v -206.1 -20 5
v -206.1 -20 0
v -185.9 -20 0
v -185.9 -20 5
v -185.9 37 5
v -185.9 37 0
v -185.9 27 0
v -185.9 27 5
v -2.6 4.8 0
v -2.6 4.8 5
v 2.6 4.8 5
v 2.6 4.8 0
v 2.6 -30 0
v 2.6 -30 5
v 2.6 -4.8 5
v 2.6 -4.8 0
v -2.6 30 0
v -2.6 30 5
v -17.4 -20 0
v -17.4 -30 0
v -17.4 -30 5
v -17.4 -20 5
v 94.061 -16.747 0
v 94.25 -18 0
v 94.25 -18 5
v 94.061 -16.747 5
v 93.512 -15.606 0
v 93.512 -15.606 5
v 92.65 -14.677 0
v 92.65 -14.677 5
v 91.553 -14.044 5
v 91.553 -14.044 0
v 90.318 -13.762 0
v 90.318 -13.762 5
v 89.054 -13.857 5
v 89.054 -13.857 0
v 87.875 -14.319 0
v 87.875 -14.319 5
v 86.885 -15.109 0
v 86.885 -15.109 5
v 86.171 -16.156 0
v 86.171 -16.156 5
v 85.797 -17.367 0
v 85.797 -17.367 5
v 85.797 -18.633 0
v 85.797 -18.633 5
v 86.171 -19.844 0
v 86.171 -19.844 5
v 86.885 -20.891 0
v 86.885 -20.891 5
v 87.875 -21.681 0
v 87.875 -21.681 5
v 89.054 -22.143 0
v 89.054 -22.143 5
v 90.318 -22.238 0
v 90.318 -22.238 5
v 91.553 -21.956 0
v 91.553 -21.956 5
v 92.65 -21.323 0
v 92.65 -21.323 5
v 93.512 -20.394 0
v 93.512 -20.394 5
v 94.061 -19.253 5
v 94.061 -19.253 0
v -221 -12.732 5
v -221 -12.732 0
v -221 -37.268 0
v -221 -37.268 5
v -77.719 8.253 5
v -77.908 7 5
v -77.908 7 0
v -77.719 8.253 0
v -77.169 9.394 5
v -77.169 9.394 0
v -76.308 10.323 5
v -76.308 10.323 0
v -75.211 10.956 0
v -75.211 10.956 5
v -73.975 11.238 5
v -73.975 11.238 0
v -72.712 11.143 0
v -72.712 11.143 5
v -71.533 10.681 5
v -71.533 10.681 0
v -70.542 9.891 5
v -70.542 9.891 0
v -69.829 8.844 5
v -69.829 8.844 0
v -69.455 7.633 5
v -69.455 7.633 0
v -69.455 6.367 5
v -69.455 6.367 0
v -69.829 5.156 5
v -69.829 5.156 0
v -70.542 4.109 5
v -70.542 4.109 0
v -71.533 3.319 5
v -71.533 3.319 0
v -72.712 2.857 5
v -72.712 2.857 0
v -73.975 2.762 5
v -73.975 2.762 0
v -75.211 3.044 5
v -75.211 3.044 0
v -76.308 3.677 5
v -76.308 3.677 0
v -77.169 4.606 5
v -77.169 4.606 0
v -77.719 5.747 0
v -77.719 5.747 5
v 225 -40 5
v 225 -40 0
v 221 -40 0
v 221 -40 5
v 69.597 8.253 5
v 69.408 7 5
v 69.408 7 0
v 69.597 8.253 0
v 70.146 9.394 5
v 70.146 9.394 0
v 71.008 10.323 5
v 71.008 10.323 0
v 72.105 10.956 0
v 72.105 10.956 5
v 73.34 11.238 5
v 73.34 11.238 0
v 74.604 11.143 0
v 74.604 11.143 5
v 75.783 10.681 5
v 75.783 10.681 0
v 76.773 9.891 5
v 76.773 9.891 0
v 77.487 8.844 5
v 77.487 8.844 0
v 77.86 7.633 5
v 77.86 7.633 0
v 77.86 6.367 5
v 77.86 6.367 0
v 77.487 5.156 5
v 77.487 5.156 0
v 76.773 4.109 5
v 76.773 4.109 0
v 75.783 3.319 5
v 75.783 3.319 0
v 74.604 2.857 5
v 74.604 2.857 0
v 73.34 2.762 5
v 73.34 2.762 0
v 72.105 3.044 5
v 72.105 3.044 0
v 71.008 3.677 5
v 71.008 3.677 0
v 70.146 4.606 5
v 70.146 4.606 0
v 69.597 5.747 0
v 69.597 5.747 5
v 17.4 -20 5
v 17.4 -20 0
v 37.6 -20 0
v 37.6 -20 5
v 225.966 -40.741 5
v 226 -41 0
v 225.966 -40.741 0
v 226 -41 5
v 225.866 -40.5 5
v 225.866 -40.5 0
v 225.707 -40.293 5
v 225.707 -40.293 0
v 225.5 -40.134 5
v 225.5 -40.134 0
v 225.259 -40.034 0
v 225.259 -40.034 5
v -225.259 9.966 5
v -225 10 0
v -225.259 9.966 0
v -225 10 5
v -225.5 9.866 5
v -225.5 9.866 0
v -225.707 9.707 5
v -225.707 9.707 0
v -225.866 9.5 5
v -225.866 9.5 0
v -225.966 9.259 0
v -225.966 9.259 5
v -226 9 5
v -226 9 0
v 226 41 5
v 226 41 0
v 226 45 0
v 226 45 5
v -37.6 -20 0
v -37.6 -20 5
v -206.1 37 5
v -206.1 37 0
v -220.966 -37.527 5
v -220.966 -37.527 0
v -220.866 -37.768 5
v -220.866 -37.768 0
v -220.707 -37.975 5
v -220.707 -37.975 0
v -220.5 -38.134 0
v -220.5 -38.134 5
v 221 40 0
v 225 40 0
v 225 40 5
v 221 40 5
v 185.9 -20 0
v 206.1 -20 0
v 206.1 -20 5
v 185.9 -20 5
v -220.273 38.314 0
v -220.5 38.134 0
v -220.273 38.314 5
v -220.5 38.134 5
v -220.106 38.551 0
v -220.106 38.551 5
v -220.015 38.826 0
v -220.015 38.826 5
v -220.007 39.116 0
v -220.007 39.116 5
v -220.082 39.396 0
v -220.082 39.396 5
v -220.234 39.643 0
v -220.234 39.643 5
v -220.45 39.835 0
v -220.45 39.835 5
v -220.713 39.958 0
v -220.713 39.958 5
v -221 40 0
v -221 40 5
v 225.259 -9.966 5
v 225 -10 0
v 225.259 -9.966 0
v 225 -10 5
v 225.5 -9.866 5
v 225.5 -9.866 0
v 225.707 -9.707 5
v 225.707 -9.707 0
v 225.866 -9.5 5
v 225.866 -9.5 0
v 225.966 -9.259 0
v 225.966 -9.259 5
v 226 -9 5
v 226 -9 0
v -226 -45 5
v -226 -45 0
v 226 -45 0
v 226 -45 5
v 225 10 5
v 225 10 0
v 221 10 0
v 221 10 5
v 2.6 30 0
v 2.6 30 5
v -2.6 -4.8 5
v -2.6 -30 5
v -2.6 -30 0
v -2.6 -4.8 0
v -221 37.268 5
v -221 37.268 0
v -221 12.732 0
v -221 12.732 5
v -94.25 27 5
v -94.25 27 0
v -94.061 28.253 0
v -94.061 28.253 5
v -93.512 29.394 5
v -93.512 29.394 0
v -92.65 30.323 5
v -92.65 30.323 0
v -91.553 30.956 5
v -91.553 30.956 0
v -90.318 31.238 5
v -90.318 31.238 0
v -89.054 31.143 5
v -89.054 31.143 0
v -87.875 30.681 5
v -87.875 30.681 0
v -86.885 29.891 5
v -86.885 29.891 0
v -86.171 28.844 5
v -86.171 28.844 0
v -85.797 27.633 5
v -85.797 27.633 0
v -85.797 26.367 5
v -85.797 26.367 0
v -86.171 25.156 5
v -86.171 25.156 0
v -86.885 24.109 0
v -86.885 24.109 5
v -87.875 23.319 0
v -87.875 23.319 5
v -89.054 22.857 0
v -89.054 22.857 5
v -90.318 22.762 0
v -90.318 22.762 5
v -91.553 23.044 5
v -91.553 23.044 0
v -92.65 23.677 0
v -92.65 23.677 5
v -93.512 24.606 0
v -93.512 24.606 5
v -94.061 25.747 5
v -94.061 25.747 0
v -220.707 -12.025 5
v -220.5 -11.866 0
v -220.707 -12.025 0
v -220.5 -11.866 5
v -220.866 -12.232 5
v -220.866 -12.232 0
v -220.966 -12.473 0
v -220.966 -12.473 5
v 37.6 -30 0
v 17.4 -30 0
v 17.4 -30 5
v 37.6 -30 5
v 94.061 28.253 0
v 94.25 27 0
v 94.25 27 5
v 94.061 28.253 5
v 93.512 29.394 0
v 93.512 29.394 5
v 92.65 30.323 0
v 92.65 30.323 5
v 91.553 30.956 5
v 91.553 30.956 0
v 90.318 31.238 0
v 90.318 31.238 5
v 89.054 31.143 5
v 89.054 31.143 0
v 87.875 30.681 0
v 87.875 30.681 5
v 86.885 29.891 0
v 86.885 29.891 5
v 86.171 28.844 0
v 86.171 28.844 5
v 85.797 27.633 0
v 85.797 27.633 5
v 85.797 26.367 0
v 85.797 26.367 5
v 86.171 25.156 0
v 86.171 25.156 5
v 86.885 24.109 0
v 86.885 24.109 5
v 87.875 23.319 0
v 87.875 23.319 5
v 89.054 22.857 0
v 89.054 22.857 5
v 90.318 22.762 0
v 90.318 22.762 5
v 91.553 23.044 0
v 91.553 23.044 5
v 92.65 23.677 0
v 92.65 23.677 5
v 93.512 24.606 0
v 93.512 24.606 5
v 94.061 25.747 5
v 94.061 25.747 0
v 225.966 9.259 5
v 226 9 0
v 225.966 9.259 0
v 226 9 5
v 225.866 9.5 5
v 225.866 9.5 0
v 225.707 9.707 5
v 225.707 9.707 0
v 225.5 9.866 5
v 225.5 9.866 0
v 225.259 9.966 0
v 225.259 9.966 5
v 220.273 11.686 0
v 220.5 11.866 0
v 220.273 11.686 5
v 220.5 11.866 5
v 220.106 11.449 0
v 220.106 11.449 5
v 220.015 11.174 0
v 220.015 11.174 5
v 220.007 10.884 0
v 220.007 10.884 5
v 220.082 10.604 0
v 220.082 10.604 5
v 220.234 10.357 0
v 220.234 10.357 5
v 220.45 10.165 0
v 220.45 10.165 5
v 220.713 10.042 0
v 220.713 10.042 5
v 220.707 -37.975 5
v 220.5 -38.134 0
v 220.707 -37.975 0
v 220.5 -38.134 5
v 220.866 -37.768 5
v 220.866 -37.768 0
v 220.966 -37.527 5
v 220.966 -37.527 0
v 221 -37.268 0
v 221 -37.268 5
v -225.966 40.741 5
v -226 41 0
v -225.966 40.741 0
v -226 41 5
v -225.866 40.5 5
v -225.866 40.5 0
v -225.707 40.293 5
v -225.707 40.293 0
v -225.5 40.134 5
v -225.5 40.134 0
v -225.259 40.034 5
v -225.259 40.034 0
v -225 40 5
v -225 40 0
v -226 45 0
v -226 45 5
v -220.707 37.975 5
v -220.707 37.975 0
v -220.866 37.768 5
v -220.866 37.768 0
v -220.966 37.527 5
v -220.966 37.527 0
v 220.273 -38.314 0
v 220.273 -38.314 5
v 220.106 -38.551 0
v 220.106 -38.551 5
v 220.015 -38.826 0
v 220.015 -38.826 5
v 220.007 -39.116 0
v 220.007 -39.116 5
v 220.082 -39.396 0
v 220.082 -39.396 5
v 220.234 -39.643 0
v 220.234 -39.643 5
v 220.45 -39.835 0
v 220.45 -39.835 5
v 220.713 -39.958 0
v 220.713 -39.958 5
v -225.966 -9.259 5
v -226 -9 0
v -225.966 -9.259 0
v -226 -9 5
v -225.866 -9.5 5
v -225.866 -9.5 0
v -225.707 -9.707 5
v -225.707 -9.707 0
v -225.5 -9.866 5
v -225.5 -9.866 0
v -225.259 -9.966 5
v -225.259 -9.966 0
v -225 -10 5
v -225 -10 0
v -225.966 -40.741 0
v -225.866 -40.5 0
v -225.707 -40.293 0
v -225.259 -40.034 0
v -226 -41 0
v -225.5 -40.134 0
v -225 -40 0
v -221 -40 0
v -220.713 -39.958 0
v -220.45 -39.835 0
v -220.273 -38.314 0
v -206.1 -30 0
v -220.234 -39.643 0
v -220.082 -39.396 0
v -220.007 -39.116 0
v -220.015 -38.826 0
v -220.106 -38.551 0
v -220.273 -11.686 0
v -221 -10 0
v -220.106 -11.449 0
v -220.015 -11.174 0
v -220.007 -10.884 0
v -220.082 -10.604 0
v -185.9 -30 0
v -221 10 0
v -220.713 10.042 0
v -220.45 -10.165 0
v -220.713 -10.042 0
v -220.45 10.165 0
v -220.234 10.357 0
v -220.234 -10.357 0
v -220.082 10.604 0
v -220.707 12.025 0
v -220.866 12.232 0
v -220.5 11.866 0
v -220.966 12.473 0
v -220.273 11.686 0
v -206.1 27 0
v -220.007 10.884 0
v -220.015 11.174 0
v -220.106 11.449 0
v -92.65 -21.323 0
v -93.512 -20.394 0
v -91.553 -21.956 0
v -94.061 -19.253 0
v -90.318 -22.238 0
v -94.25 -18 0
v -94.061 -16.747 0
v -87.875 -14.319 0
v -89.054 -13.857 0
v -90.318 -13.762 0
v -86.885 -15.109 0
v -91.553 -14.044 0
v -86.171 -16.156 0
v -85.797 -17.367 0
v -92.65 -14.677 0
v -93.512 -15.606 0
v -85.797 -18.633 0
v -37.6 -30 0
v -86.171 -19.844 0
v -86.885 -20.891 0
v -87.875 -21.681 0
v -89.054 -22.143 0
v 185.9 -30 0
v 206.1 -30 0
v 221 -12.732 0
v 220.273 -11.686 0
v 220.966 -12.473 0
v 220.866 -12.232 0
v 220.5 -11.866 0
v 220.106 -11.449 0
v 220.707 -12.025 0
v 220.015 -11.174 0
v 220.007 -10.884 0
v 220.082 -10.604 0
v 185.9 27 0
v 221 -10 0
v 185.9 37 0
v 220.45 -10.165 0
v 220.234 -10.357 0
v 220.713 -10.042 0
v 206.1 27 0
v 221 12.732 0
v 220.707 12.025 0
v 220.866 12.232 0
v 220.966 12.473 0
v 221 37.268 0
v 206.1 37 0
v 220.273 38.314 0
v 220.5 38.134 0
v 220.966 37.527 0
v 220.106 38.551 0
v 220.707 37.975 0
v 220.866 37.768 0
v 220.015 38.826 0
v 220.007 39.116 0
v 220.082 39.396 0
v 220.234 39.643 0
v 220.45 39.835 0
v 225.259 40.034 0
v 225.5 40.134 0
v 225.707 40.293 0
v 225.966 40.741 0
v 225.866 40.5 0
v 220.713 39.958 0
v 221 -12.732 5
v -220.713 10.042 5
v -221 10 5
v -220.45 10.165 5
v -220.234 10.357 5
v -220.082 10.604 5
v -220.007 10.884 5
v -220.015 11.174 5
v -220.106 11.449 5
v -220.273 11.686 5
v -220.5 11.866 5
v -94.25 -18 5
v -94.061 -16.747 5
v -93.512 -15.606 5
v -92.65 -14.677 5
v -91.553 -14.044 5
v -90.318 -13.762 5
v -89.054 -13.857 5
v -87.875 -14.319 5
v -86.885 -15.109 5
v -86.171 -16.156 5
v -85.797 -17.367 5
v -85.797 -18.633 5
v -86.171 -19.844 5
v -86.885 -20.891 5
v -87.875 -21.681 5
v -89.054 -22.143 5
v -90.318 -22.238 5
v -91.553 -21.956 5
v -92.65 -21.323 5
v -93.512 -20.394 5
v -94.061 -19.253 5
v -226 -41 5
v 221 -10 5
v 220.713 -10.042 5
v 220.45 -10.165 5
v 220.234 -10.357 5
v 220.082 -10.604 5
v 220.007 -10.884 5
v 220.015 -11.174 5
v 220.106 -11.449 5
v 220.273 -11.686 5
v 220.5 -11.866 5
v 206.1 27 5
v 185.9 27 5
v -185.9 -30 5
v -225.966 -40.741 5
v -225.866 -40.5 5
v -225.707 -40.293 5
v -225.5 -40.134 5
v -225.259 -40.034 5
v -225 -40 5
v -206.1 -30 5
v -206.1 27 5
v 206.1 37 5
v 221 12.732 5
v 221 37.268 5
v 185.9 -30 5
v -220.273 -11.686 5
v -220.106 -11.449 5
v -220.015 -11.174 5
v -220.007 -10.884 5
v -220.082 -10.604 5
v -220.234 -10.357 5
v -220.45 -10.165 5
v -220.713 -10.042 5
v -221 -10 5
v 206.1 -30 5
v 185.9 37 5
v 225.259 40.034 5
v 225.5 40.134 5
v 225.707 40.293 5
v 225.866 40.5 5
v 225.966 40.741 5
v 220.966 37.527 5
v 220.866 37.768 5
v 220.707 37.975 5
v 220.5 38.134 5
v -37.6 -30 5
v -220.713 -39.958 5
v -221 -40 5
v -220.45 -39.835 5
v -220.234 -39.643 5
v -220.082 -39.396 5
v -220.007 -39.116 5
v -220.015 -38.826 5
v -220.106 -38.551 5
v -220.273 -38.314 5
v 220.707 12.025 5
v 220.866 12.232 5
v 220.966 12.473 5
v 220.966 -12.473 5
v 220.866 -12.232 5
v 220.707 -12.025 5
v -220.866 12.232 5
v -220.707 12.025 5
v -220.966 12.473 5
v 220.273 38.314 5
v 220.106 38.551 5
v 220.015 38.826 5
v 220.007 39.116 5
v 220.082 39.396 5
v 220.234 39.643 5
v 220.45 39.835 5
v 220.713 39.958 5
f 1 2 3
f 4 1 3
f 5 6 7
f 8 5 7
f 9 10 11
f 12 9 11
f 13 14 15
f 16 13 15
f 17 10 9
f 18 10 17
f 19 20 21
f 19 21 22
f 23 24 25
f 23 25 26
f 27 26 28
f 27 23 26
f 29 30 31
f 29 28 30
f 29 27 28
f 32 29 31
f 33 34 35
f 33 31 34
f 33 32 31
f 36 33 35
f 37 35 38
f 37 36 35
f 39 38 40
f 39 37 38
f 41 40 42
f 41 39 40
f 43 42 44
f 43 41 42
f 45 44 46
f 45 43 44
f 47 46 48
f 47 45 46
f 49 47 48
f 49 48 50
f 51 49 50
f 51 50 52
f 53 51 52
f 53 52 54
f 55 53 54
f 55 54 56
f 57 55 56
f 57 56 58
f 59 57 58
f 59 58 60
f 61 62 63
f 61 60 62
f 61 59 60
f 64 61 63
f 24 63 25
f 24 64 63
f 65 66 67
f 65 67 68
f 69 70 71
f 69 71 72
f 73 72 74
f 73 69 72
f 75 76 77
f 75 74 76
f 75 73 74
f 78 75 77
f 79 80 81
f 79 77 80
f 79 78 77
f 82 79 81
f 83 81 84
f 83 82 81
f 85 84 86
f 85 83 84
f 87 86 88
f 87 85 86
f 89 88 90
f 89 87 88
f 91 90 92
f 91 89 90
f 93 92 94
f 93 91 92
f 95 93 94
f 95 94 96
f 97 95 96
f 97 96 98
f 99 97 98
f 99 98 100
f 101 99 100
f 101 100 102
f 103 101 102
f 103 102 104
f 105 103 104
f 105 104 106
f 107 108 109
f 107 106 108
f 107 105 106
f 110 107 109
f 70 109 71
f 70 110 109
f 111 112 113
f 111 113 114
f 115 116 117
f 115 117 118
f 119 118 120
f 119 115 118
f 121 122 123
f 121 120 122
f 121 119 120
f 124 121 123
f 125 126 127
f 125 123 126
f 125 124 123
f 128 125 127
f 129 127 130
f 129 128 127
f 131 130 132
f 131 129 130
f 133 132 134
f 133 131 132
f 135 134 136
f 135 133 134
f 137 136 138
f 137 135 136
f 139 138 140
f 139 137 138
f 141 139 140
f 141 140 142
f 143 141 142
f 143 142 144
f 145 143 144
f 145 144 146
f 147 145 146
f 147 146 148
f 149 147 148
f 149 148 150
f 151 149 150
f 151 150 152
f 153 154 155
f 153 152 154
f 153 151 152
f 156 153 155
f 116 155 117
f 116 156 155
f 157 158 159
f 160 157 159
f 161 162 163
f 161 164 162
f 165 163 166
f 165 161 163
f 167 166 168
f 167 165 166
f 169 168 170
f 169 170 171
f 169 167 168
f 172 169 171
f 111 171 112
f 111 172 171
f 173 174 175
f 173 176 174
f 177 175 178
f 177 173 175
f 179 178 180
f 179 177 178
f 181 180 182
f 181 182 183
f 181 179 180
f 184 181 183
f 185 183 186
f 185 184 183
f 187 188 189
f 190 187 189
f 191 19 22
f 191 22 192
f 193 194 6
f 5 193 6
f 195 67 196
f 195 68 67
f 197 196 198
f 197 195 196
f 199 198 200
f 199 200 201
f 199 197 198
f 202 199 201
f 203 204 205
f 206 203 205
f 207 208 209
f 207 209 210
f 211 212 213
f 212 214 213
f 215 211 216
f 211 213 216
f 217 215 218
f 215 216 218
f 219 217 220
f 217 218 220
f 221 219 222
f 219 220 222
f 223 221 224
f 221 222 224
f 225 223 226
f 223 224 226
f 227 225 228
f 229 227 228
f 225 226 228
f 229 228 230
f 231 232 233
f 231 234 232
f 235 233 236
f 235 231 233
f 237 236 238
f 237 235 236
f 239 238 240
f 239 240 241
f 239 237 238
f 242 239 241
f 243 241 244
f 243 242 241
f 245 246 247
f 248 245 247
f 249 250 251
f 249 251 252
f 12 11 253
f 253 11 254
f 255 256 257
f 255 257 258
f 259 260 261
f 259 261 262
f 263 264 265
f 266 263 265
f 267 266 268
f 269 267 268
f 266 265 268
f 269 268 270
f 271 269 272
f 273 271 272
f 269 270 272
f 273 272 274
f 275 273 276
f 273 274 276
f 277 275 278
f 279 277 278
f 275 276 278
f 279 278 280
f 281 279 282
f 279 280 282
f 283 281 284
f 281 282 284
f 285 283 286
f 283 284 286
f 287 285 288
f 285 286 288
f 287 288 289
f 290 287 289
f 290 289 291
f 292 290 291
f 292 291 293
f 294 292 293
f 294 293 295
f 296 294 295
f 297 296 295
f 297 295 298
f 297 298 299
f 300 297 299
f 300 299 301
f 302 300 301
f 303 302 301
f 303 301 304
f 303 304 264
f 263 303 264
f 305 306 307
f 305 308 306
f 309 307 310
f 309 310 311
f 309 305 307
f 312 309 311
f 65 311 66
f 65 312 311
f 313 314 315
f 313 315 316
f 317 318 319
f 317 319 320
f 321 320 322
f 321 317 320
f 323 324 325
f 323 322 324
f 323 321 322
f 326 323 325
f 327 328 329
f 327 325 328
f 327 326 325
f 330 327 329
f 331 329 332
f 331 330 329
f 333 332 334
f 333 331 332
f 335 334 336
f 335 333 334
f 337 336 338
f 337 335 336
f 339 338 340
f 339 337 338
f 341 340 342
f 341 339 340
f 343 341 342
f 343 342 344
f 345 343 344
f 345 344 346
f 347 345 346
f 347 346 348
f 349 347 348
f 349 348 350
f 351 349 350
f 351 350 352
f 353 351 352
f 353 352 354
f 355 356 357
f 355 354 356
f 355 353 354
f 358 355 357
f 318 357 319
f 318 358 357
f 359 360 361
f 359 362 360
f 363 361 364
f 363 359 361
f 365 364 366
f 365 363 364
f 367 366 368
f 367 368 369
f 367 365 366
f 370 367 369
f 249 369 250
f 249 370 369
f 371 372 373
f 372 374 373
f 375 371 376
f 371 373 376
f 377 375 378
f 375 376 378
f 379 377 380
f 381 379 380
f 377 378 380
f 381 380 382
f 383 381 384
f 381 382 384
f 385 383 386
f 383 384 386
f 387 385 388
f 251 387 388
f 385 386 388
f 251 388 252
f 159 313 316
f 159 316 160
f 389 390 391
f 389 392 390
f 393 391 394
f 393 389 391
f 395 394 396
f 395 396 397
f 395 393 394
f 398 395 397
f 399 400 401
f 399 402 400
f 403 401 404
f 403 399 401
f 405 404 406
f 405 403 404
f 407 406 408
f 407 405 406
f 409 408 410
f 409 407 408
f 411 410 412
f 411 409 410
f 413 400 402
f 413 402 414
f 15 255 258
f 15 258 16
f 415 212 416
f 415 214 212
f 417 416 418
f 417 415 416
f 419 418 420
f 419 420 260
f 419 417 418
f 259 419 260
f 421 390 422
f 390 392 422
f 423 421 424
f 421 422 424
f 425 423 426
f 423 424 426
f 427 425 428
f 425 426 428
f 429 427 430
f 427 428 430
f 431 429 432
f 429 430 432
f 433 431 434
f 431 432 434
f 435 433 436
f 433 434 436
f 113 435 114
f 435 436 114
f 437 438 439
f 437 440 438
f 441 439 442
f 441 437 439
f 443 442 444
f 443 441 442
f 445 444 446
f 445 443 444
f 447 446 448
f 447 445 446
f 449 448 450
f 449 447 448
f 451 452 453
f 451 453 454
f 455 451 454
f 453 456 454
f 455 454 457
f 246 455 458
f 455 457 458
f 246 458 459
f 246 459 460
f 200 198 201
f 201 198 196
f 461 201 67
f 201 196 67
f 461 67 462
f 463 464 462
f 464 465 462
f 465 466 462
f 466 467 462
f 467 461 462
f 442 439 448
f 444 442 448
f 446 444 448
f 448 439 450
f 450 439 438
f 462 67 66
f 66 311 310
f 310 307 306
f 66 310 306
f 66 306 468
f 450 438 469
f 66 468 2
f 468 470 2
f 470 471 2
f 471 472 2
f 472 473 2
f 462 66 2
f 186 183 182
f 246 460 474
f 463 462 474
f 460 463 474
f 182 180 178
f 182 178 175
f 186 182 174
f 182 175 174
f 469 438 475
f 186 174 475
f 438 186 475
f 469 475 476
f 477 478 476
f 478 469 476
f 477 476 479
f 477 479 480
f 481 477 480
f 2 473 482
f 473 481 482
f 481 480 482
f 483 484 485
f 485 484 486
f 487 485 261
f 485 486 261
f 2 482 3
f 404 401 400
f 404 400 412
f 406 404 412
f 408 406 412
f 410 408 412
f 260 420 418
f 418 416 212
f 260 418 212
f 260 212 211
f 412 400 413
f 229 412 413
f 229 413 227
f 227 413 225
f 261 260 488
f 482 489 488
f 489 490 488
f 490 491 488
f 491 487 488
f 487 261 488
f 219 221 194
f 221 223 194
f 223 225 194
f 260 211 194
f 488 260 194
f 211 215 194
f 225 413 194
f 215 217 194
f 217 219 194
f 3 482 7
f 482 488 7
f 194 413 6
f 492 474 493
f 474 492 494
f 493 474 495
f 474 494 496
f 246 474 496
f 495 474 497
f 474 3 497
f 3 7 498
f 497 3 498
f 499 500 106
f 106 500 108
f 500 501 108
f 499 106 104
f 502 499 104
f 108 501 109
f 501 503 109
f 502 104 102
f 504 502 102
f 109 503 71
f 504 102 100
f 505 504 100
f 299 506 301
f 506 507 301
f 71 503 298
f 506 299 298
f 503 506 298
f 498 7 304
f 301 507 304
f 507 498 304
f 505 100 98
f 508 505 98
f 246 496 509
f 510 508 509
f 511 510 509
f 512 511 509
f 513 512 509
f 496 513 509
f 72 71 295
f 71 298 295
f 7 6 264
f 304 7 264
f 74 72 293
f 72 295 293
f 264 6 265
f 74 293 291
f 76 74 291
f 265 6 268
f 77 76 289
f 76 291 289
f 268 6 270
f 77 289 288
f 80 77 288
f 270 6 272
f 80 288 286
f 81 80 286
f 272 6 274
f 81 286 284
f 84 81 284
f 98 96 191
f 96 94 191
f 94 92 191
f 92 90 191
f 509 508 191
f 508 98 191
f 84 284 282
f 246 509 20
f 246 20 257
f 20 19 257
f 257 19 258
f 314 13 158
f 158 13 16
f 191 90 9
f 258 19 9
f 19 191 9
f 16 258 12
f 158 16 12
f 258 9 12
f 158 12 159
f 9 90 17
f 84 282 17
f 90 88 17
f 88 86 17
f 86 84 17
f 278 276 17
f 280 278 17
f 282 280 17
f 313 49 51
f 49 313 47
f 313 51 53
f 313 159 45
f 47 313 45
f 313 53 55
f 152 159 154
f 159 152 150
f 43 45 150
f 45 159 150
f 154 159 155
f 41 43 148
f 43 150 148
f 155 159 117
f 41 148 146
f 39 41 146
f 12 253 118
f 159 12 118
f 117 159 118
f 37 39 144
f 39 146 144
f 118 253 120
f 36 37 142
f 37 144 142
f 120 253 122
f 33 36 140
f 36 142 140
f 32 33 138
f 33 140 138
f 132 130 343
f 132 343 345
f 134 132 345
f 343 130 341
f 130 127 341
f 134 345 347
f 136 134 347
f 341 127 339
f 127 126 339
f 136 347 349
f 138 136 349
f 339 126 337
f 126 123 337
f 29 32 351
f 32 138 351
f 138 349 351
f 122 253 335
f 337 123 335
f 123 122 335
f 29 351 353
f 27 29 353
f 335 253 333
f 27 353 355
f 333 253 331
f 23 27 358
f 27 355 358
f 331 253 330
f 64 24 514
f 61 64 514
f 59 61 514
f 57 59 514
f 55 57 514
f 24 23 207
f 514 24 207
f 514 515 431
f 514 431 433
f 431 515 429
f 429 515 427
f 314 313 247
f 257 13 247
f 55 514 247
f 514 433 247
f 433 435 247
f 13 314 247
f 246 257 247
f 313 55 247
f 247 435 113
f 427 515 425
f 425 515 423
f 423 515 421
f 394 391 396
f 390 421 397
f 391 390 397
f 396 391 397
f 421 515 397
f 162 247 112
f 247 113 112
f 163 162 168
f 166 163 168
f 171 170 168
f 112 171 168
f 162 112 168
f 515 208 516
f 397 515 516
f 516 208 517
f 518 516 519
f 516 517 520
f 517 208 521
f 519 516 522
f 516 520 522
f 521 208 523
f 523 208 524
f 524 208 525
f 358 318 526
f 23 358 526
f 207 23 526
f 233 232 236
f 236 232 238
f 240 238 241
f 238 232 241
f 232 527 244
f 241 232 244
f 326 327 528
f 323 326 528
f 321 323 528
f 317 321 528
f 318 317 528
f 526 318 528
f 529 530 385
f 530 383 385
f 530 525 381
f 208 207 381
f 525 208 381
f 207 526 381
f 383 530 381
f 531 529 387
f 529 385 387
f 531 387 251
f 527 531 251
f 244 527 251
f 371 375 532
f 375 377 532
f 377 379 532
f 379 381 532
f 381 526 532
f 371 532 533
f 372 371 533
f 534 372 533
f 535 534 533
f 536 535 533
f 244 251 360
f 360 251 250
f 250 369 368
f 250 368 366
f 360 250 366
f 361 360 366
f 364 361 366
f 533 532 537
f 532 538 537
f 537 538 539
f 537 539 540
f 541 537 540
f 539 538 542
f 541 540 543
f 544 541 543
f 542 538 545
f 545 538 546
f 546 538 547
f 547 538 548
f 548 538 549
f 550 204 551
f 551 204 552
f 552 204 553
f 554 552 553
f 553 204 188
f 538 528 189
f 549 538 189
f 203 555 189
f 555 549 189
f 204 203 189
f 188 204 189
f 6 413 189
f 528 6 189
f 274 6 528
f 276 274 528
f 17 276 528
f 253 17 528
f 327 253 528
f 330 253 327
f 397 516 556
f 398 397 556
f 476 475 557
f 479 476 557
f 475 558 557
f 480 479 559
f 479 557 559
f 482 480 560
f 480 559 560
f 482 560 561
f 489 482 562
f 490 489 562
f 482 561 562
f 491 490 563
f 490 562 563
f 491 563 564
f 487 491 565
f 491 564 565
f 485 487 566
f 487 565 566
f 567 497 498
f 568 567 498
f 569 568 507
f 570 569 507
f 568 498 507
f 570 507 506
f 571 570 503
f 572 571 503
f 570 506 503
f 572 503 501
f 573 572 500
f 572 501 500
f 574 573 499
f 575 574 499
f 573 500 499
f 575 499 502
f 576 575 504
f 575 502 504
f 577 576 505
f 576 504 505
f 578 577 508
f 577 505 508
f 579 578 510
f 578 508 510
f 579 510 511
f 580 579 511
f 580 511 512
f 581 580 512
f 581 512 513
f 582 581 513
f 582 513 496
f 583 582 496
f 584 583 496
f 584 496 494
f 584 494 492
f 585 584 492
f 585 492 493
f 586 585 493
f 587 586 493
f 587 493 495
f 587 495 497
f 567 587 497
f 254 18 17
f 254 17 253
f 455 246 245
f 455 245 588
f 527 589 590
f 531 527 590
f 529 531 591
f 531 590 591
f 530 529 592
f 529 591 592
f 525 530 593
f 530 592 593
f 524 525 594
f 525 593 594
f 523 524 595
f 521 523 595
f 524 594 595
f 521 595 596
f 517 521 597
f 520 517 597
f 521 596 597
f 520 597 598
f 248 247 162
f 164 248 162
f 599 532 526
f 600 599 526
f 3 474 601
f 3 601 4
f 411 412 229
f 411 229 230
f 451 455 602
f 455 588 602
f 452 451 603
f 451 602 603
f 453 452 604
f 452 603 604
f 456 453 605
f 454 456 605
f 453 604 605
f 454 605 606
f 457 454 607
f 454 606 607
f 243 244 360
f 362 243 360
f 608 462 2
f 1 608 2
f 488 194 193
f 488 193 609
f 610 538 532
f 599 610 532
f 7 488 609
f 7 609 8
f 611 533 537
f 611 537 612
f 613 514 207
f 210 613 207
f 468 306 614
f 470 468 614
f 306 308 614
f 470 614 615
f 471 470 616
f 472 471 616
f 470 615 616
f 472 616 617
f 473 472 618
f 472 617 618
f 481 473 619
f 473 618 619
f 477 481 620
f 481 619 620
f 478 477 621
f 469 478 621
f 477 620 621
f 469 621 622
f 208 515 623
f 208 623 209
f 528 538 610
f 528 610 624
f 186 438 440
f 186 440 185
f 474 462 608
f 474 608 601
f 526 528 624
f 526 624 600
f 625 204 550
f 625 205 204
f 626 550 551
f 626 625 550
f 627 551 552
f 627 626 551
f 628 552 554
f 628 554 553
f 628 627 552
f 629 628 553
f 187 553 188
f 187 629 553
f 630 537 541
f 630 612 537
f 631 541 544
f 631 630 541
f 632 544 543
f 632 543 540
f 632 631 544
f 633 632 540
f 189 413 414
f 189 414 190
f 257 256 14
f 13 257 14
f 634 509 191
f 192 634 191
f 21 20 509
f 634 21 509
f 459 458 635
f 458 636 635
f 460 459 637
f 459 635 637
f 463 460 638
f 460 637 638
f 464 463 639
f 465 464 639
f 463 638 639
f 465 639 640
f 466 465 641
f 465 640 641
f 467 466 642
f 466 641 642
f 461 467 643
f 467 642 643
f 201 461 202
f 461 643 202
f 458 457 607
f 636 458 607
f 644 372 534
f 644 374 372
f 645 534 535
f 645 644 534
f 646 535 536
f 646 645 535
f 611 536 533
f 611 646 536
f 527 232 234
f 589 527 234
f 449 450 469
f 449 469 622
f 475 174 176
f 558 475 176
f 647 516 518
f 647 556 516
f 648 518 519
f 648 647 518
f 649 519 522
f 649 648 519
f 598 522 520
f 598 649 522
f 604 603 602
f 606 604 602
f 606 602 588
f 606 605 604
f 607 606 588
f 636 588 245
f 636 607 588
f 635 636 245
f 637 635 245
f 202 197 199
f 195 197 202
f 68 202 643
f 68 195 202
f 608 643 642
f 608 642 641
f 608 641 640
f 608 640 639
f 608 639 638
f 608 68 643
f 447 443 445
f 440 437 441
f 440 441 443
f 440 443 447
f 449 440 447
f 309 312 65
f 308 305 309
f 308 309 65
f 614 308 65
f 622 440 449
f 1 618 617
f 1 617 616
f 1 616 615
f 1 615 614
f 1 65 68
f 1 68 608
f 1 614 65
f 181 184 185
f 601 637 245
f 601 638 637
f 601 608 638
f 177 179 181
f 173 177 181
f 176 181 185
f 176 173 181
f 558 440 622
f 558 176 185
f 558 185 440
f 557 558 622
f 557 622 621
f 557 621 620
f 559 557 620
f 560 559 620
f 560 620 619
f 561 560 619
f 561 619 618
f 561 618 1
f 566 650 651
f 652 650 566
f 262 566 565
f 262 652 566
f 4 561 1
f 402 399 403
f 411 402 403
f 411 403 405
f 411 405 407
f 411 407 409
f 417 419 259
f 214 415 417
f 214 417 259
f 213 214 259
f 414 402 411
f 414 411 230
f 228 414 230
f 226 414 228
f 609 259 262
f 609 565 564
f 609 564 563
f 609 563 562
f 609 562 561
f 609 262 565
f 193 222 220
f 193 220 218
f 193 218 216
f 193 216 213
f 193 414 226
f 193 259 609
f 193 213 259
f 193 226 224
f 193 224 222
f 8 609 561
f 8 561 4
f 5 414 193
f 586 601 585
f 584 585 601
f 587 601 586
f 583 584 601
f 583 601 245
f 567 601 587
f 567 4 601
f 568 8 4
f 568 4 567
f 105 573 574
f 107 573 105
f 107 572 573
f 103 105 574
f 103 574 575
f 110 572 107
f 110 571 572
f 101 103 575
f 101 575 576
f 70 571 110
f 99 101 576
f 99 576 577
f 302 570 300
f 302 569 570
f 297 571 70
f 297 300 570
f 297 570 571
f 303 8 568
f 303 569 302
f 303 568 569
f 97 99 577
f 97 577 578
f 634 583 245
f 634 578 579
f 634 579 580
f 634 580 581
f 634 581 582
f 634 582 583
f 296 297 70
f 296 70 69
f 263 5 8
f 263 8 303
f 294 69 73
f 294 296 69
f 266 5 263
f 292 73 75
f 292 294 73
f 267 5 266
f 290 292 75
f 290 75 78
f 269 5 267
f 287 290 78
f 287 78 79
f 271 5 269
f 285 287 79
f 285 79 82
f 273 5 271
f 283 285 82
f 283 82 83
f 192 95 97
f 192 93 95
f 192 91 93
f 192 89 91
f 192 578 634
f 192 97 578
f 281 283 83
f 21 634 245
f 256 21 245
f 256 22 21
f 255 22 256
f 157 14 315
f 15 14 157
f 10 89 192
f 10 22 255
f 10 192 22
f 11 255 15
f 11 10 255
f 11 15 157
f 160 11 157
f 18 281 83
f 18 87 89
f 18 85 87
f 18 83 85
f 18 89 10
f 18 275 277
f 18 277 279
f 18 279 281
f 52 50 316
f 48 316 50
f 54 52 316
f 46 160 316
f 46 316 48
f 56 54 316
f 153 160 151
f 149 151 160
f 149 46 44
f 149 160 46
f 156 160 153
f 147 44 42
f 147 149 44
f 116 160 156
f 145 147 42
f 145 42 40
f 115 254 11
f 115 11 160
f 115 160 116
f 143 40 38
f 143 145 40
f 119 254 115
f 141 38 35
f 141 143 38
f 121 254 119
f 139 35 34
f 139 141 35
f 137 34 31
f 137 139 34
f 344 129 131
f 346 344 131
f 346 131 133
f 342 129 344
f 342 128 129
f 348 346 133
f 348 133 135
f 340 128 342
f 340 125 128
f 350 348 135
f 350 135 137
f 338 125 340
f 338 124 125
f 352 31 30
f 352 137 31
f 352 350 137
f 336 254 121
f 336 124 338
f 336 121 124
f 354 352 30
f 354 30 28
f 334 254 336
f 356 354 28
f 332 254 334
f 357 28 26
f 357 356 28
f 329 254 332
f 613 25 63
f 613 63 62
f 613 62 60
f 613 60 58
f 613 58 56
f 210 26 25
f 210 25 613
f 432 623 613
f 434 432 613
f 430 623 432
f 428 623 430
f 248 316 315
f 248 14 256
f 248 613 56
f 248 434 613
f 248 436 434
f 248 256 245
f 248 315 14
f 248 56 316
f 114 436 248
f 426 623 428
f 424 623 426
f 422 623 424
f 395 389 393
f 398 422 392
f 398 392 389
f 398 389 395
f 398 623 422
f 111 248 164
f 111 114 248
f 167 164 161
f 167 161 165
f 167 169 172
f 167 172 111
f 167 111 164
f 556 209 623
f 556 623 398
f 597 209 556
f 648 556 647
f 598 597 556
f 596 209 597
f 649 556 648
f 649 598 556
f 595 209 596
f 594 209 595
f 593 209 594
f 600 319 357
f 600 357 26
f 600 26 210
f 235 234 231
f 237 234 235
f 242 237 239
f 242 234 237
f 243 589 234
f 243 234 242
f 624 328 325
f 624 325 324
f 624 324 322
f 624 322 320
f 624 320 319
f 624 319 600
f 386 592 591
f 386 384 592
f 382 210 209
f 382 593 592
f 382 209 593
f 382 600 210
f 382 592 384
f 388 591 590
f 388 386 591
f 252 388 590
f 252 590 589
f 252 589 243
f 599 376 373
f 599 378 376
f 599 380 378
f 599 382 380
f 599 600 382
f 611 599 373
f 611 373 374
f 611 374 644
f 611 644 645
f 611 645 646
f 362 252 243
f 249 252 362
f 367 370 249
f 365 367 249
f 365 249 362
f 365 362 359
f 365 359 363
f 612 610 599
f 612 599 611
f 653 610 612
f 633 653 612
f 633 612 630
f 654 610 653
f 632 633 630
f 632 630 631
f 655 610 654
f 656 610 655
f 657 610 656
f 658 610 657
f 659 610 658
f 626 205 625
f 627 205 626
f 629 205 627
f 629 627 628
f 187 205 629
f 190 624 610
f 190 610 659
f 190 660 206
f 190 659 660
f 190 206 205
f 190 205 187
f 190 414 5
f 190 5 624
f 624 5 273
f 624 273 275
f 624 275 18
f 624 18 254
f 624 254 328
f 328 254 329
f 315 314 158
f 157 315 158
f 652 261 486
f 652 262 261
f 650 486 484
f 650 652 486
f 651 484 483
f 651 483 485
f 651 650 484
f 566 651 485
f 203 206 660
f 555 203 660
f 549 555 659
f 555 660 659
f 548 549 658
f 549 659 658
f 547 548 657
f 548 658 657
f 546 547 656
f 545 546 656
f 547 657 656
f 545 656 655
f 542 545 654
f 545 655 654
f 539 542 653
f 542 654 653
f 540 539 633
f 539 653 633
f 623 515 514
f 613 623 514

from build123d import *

# Parameters (mm, degrees)
SKETCH1_W                = 452
SKETCH1_H                = 90
BOSS_EXTRUDE1_DEPTH      = 5
SKETCH2_W                = 5.2
SKETCH2_H                = 25.2
CUT_EXTRUDE1_DEPTH       = 231.490780727
SKETCH4_W                = 5
SKETCH4_H                = 30
CUT_EXTRUDE5_DEPTH       = 5
SKETCH7_R                = 1
CUT_EXTRUDE6_DEPTH       = 231.490780727
FILLET4_R                = 1
SKETCH8_W                = 20.2
SKETCH8_H                = 10
CUT_EXTRUDE7_DEPTH       = 10
SKETCH9_W                = 20.2
SKETCH9_H                = 10
CUT_EXTRUDE8_DEPTH       = 300
MIRROR5_COPY_1_SKETCH_W  = 20.2
MIRROR5_COPY_1_SKETCH_H  = 10
MIRROR5_COPY_1_DEPTH     = 10
SKETCH11_R               = 4.25
CUT_EXTRUDE10_DEPTH      = 20
CUT_EXTRUDE11_DEPTH      = 30
CUT_EXTRUDE11_DEPTH_BACK = 600
SKETCH12_R               = 4.25


with BuildPart() as part:
    # Sketch1 → Boss-Extrude1 (new body)
    with BuildSketch(Plane.XY):
        Rectangle(SKETCH1_W, SKETCH1_H)
    extrude(amount=BOSS_EXTRUDE1_DEPTH)

    # Sketch2 → Cut-Extrude1 (cut, through all)
    with BuildSketch(Plane.XY.offset(5)):
        with Locations((0, 17.4)):
            Rectangle(SKETCH2_W, SKETCH2_H)
        with Locations((0, -17.4)):
            Rectangle(SKETCH2_W, SKETCH2_H)
    extrude(amount=-CUT_EXTRUDE1_DEPTH, mode=Mode.SUBTRACT)

    # Sketch4 → Cut-Extrude5 (cut)
    with BuildSketch(Plane.ZY.offset(226)):
        with Locations((2.5, 25)):
            Rectangle(SKETCH4_W, SKETCH4_H)
        with Locations((2.5, -25)):
            Rectangle(SKETCH4_W, SKETCH4_H)
    cut_extrude5 = extrude(amount=-CUT_EXTRUDE5_DEPTH, mode=Mode.SUBTRACT)

    # Mirror2: Cut-Extrude5 across plane
    add(cut_extrude5.mirror(Plane(origin=(0, 0, 0), x_dir=(0, 0, 1), z_dir=(1, 0, 0))), mode=Mode.SUBTRACT)

    # Sketch7 → Cut-Extrude6 (cut, through all)
    with BuildSketch(Plane.XY.offset(5)):
        with Locations((-221, 39)):
            Circle(SKETCH7_R)
        with Locations((-221, 11)):
            Circle(SKETCH7_R)
        with Locations((-221, -11)):
            Circle(SKETCH7_R)
        with Locations((-221, -39)):
            Circle(SKETCH7_R)
        with Locations((221, -39)):
            Circle(SKETCH7_R)
        with Locations((221, -11)):
            Circle(SKETCH7_R)
        with Locations((221, 11)):
            Circle(SKETCH7_R)
        with Locations((221, 39)):
            Circle(SKETCH7_R)
    extrude(amount=-CUT_EXTRUDE6_DEPTH, mode=Mode.SUBTRACT)

    # Fillet4
    fillet4_edges = [part.edges().sort_by_distance(p)[0] for p in [
        (221, 38, 2.5),
        (221, 12, 2.5),
        (221, -12, 2.5),
        (221, -38, 2.5),
        (-221, 38, 2.5),
        (-221, 12, 2.5),
        (-221, -38, 2.5),
        (-221, -12, 2.5),
        (-226, 10, 2.5),
        (-226, 40, 2.5),
        (-226, -40, 2.5),
        (-226, -10, 2.5),
        (226, 10, 2.5),
        (226, 40, 2.5),
        (226, -40, 2.5),
        (226, -10, 2.5),
    ]]
    fillet(fillet4_edges, radius=FILLET4_R)

    # Sketch8 → Cut-Extrude7 (cut)
    with BuildSketch(Plane(origin=(0, -610.456150304, 0), x_dir=(-1, 0, 0), z_dir=(0, 0, -1))):
        with Locations((-196, 585.456150304)):
            Rectangle(SKETCH8_W, SKETCH8_H)
    cut_extrude7 = extrude(amount=-CUT_EXTRUDE7_DEPTH, mode=Mode.SUBTRACT)

    # Mirror3: Cut-Extrude7 across plane
    add(cut_extrude7.mirror(Plane(origin=(0, 0, 0), x_dir=(0, 0, 1), z_dir=(1, 0, 0))), mode=Mode.SUBTRACT)

    # Sketch9 → Cut-Extrude8 (cut)
    with BuildSketch(Plane(origin=(0, -610.456150304, -223.6), x_dir=(-1, 0, 0), z_dir=(0, 0, -1))):
        with Locations((27.5, 585.456150304)):
            Rectangle(SKETCH9_W, SKETCH9_H)
    cut_extrude8 = extrude(amount=-CUT_EXTRUDE8_DEPTH, mode=Mode.SUBTRACT)

    # Mirror4: Cut-Extrude8 across plane
    add(cut_extrude8.mirror(Plane(origin=(0, 0, 0), x_dir=(0, 0, 1), z_dir=(1, 0, 0))), mode=Mode.SUBTRACT)

    # Mirror5: Cut-Extrude7 across plane
    add(cut_extrude7.mirror(Plane.ZX.offset(3.5)), mode=Mode.SUBTRACT)

    # Mirror5 copy 1 sketch → Mirror5 copy 1 (cut)
    with BuildSketch(Plane(origin=(0, 617.456150304, 0), x_dir=(1, 0, 0), z_dir=(0, 0, -1))):
        with Locations((-196, 585.456150304)):
            Rectangle(MIRROR5_COPY_1_SKETCH_W, MIRROR5_COPY_1_SKETCH_H)
    extrude(amount=-MIRROR5_COPY_1_DEPTH, mode=Mode.SUBTRACT)

    # Sketch11 → Cut-Extrude10 (cut)
    with BuildSketch(Plane(origin=(-635.072358446, 447.165636604, -5), x_dir=(1, 0, 0), z_dir=(0, 0, -1))):
        with Locations(Location((545.072358446, 420.165636604, 0), (0, 0, 180))):
            Circle(SKETCH11_R)
        with Locations(Location((545.072358446, 465.165636604, 0), (0, 0, 180))):
            Circle(SKETCH11_R)
    cut_extrude10 = extrude(amount=-CUT_EXTRUDE10_DEPTH, mode=Mode.SUBTRACT)

    # Mirror6: Cut-Extrude10 across plane
    add(cut_extrude10.mirror(Plane(origin=(0, 0, 0), x_dir=(0, 0, 1), z_dir=(1, 0, 0))), mode=Mode.SUBTRACT)

    # Sketch12 → Cut-Extrude11 (cut, two sides: drawn at the far end of the back side and taken through both)
    with BuildSketch(Plane(origin=(537.523634505, -819.47709654, 0), x_dir=(-1, 0, 0), z_dir=(0, 0, -1)).offset(-CUT_EXTRUDE11_DEPTH_BACK)):
        with Locations((611.181518753, 826.47709654)):
            Circle(SKETCH12_R)
        with Locations((463.865750257, 826.47709654)):
            Circle(SKETCH12_R)
    extrude(amount=CUT_EXTRUDE11_DEPTH + CUT_EXTRUDE11_DEPTH_BACK, mode=Mode.SUBTRACT)


solid = part.part
